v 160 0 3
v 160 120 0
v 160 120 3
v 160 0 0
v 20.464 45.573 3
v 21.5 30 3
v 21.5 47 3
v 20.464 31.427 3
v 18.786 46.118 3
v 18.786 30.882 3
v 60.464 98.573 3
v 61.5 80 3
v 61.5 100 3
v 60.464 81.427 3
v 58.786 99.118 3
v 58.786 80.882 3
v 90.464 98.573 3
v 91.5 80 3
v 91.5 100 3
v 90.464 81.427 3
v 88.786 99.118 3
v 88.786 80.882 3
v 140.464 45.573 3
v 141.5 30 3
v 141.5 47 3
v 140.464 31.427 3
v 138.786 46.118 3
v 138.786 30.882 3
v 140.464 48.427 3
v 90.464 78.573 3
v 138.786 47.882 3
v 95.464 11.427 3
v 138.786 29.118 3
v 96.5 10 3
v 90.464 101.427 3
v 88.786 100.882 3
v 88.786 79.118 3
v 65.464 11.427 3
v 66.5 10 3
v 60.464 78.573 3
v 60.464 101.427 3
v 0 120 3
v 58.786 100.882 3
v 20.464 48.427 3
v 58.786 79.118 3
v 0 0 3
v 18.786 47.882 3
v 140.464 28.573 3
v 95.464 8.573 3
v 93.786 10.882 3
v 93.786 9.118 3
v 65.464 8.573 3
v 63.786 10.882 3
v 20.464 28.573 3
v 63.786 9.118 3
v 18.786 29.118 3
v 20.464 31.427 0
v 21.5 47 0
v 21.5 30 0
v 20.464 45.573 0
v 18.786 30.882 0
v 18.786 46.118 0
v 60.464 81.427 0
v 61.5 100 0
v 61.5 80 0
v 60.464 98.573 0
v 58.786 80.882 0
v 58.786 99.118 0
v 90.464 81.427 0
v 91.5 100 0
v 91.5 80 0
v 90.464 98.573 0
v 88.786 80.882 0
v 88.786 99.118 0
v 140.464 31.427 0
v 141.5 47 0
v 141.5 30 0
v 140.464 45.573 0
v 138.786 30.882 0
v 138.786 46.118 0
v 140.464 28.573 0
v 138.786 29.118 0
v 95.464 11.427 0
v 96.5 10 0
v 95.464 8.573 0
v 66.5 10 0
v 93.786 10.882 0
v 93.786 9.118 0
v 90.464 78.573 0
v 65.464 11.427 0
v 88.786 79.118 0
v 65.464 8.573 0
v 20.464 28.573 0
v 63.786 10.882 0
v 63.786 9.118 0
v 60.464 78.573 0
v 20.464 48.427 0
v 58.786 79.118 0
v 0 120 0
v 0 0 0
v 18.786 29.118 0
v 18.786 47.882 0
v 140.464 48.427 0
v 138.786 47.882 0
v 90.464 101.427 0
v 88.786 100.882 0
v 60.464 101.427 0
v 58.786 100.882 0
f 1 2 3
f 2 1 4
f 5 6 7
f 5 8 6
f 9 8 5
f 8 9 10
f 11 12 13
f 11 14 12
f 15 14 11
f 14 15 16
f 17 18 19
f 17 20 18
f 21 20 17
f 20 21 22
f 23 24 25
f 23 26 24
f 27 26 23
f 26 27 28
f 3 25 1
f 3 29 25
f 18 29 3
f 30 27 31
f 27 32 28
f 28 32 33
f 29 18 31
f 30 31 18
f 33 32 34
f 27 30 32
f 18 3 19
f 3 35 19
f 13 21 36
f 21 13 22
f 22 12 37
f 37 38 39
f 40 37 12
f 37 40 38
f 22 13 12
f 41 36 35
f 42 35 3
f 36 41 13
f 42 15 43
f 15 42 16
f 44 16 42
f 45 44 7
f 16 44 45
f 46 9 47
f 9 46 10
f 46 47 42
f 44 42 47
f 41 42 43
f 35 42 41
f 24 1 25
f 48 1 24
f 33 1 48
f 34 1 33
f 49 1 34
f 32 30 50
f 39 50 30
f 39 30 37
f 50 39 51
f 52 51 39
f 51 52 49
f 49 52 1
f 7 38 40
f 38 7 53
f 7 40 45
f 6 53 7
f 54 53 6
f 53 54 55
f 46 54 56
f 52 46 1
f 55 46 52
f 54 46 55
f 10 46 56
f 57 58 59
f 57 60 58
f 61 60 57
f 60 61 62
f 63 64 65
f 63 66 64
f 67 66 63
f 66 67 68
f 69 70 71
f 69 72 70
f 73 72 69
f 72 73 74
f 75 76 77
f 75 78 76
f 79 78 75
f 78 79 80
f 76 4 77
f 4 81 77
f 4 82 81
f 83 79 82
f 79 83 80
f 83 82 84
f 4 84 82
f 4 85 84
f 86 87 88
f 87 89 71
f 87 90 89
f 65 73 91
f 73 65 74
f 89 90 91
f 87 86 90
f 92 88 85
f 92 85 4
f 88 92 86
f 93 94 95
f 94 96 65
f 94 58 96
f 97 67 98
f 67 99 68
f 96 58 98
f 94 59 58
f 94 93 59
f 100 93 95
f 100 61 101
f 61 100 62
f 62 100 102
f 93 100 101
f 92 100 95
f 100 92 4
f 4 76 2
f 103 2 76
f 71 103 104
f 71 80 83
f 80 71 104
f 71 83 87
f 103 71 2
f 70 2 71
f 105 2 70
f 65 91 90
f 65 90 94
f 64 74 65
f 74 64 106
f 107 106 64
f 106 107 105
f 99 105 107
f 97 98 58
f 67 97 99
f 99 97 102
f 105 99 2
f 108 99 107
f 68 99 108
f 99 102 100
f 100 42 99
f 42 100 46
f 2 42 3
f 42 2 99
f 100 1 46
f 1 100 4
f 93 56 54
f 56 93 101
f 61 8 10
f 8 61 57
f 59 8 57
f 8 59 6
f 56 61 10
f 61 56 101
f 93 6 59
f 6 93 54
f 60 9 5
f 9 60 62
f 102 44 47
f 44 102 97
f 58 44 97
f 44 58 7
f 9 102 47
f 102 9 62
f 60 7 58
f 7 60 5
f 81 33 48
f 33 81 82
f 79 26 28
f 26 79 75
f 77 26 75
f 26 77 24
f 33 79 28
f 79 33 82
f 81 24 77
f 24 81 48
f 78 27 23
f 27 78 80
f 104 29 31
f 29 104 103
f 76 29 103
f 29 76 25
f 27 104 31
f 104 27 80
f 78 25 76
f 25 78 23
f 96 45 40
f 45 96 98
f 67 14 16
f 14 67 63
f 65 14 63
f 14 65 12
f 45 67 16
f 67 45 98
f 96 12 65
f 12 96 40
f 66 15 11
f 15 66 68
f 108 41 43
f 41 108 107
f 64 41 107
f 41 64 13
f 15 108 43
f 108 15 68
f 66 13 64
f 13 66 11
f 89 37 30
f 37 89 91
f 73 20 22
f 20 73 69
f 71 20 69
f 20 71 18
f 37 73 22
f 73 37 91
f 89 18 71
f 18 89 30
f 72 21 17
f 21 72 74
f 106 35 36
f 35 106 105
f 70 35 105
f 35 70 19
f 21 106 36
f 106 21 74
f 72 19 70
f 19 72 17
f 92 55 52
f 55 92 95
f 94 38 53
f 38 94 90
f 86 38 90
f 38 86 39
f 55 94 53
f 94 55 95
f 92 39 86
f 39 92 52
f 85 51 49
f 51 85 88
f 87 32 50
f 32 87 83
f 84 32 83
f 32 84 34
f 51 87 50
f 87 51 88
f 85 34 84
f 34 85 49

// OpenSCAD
// Mars Environment Rover - Simple 2WD Chassis
// Units: millimeters

length = 160;
width = 120;
thickness = 3;

motor_hole_spacing = 17;
motor_hole_d = 3;

module chassis(){
    difference(){
        cube([length,width,thickness], center=false);

        // Motor mounting holes (left)
        translate([20,30,-1]) cylinder(h=10, d=motor_hole_d);
        translate([20,30+motor_hole_spacing,-1]) cylinder(h=10, d=motor_hole_d);

        // Motor mounting holes (right)
        translate([length-20,30,-1]) cylinder(h=10, d=motor_hole_d);
        translate([length-20,30+motor_hole_spacing,-1]) cylinder(h=10, d=motor_hole_d);

        // Arduino mounting holes
        translate([60,80,-1]) cylinder(h=10, d=3);
        translate([60,100,-1]) cylinder(h=10, d=3);
        translate([90,80,-1]) cylinder(h=10, d=3);
        translate([90,100,-1]) cylinder(h=10, d=3);

        // Ultrasonic sensor mount
        translate([length/2-15,10,-1]) cylinder(h=10, d=3);
        translate([length/2+15,10,-1]) cylinder(h=10, d=3);
    }
}

chassis();
